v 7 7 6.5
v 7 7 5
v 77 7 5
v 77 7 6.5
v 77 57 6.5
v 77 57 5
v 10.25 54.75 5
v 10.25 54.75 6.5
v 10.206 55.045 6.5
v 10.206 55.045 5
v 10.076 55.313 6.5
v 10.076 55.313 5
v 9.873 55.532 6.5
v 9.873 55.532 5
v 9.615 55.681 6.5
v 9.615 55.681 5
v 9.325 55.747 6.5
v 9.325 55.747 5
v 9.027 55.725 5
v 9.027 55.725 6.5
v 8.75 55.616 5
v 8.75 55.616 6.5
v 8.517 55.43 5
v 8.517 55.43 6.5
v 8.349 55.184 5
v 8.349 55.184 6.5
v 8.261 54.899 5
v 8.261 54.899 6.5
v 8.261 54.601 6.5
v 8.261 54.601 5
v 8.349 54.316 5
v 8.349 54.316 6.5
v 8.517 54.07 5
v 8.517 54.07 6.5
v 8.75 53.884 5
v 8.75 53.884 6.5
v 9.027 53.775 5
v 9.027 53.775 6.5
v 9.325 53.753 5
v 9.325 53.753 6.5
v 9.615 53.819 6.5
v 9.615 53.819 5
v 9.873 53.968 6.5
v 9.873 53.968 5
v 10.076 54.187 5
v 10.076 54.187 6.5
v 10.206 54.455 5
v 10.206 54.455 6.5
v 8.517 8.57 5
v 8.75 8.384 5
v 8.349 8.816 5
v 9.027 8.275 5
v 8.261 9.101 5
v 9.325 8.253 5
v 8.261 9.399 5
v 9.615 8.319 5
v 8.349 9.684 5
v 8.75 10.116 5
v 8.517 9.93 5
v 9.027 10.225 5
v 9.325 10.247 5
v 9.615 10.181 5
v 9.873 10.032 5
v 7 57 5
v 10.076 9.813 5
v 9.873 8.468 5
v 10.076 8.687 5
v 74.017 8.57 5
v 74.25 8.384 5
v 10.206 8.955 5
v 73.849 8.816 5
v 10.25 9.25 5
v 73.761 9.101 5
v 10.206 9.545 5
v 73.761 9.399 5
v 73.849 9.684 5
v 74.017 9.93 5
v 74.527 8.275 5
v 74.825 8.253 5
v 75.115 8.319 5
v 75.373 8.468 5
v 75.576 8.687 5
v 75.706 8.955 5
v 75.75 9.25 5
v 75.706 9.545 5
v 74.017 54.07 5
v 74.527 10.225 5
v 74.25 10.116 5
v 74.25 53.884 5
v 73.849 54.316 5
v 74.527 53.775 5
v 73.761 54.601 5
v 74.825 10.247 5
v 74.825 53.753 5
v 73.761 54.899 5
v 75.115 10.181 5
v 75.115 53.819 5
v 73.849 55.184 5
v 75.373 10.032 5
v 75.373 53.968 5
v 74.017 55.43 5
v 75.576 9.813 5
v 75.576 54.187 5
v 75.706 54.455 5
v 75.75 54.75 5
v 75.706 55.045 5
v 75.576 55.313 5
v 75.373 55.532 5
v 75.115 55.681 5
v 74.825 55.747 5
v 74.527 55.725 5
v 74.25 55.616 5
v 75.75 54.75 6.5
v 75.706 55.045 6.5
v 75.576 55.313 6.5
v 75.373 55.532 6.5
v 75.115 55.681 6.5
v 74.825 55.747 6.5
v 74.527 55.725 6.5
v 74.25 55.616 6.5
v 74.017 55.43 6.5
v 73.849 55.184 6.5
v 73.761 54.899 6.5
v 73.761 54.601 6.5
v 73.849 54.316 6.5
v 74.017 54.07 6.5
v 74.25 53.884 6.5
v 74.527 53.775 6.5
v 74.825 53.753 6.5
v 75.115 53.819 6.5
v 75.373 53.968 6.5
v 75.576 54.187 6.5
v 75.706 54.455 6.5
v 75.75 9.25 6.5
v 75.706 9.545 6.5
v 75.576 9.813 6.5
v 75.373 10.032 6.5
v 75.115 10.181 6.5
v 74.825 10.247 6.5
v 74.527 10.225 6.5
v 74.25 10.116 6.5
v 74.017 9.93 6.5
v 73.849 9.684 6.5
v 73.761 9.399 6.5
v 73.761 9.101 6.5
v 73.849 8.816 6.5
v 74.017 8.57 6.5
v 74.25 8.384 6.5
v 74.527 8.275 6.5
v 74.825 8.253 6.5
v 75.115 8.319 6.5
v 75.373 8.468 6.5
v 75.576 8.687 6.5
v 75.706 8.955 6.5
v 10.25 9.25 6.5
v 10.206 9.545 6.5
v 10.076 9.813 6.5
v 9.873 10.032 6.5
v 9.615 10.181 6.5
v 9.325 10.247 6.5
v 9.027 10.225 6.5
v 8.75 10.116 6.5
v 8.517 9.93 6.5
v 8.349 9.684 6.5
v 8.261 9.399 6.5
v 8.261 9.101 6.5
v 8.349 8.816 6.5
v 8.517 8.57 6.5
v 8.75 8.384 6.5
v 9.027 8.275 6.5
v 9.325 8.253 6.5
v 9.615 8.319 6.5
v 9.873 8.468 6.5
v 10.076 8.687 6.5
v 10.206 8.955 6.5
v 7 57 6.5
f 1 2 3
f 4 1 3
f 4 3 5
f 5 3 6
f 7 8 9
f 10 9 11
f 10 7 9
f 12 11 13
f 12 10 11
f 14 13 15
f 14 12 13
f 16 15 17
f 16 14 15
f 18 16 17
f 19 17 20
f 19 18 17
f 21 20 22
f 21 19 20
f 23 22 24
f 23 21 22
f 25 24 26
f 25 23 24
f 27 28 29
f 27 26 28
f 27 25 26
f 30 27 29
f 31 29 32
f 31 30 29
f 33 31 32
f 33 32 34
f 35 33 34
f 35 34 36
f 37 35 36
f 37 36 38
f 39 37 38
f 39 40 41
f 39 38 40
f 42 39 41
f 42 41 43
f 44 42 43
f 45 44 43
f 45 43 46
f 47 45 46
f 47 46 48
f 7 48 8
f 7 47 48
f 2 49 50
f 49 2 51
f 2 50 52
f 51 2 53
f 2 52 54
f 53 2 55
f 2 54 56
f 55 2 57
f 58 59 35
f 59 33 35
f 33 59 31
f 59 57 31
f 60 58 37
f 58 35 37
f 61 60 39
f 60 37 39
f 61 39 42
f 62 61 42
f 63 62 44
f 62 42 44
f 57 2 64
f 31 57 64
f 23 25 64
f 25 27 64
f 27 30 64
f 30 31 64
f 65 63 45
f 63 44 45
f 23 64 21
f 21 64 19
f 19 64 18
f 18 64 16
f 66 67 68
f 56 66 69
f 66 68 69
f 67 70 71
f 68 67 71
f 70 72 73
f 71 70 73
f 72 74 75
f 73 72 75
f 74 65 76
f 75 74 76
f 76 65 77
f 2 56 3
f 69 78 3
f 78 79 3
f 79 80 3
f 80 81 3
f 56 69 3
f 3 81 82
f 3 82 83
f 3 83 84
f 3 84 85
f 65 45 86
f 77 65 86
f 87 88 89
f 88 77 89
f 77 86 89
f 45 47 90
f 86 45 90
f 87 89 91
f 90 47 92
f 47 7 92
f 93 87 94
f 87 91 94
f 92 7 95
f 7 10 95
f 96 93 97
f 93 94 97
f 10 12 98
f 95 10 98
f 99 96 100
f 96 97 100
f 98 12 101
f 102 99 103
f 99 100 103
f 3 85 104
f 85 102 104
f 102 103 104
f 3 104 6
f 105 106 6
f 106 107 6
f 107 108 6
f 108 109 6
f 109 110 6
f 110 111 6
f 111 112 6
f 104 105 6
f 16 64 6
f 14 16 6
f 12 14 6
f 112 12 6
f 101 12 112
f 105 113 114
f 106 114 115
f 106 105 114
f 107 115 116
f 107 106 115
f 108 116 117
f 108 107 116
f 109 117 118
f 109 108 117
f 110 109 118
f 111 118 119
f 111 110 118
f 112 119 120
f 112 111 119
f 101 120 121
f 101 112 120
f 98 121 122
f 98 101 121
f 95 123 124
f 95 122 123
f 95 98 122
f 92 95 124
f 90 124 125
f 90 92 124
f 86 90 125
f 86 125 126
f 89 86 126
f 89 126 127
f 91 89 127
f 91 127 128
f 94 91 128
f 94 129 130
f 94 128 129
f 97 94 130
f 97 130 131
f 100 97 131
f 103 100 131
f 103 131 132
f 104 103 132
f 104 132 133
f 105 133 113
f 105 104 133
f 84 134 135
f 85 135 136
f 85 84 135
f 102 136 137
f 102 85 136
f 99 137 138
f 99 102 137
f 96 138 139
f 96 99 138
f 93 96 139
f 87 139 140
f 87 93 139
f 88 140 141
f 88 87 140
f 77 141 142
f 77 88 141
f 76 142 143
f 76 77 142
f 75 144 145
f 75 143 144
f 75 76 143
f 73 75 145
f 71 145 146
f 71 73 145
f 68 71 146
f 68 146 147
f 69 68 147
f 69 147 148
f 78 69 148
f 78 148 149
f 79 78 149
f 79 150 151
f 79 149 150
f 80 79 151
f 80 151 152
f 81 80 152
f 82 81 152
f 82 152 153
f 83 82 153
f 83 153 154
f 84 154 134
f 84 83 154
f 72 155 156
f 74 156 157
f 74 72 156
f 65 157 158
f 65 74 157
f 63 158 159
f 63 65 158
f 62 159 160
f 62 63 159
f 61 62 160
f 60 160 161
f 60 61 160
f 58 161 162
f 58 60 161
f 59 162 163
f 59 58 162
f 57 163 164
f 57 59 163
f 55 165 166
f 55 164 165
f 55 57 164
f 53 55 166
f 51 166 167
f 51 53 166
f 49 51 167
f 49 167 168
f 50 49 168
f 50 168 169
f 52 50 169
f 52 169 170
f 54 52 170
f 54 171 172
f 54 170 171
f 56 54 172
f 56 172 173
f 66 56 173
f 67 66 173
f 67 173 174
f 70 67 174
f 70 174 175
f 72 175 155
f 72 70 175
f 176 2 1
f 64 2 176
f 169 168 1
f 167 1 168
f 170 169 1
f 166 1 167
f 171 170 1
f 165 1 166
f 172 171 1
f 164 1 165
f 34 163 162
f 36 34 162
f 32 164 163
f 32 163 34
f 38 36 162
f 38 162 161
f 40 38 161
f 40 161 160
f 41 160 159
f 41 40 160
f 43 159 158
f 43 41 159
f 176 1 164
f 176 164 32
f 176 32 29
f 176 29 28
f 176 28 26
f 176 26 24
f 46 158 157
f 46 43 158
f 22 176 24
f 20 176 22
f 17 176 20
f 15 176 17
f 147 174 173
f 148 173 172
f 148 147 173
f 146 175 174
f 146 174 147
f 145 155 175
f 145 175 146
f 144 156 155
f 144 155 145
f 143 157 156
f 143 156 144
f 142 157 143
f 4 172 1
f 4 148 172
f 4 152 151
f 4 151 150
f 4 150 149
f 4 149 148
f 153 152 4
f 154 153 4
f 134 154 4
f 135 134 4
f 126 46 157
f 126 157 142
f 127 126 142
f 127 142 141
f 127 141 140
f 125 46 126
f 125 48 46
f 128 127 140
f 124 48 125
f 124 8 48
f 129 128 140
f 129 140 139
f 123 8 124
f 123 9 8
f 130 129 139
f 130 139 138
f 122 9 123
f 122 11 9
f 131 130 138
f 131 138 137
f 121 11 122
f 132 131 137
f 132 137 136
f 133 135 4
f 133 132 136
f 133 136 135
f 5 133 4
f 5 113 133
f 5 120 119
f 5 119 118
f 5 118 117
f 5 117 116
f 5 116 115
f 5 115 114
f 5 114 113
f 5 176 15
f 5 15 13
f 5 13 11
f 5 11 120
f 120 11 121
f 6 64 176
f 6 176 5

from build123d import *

# Parameters (mm, degrees)
CYLINDER004_R     = 1
CYLINDER004_DEPTH = 10
ARRAY002_X_COUNT  = 2
ARRAY002_X_PITCH  = 65.5
ARRAY002_Y_COUNT  = 2
ARRAY002_Y_PITCH  = 45.5
BOX005_W          = 70
BOX005_H          = 50
BOX005_DEPTH      = 1.5


with BuildPart() as pcb_hole_array:
    # Cylinder004 → Cylinder004 (new body)
    with BuildSketch(Plane.XY):
        Circle(CYLINDER004_R)
    extrude(amount=CYLINDER004_DEPTH)

    # Array002 X: pcb hole array ×2


with BuildPart() as pcb_hole_array_1:
    add(pcb_hole_array.part)
    with Locations(*[(i * ARRAY002_X_PITCH, 0, 0) for i in range(1, ARRAY002_X_COUNT)]):
        add(pcb_hole_array.part)

    # Array002 Y: pcb hole array ×2


with BuildPart() as pcb_hole_array_2:
    add(pcb_hole_array_1.part)
    with Locations(*[(0, i * ARRAY002_Y_PITCH, 0) for i in range(1, ARRAY002_Y_COUNT)]):
        add(pcb_hole_array_1.part)


with BuildPart() as pcb_hole_array_3:
    # Array002 placement: moved
    add(pcb_hole_array_2.part.moved(Location((2.25, 2.25, 0))))


with BuildPart() as pcb_7x5_mockup_cut:
    # Box005 → Box005 (new body)
    with BuildSketch(Plane.XY):
        with Locations((35, 25)):
            Rectangle(BOX005_W, BOX005_H)
    extrude(amount=BOX005_DEPTH)

    # Cut002: cut pcb hole array
    add(pcb_hole_array_3.part, mode=Mode.SUBTRACT)


with BuildPart() as pcb_7x5_mockup_cut_1:
    # Cut002 placement: moved
    add(pcb_7x5_mockup_cut.part.moved(Location((7, 7, 5))))


solid = pcb_7x5_mockup_cut_1.part
